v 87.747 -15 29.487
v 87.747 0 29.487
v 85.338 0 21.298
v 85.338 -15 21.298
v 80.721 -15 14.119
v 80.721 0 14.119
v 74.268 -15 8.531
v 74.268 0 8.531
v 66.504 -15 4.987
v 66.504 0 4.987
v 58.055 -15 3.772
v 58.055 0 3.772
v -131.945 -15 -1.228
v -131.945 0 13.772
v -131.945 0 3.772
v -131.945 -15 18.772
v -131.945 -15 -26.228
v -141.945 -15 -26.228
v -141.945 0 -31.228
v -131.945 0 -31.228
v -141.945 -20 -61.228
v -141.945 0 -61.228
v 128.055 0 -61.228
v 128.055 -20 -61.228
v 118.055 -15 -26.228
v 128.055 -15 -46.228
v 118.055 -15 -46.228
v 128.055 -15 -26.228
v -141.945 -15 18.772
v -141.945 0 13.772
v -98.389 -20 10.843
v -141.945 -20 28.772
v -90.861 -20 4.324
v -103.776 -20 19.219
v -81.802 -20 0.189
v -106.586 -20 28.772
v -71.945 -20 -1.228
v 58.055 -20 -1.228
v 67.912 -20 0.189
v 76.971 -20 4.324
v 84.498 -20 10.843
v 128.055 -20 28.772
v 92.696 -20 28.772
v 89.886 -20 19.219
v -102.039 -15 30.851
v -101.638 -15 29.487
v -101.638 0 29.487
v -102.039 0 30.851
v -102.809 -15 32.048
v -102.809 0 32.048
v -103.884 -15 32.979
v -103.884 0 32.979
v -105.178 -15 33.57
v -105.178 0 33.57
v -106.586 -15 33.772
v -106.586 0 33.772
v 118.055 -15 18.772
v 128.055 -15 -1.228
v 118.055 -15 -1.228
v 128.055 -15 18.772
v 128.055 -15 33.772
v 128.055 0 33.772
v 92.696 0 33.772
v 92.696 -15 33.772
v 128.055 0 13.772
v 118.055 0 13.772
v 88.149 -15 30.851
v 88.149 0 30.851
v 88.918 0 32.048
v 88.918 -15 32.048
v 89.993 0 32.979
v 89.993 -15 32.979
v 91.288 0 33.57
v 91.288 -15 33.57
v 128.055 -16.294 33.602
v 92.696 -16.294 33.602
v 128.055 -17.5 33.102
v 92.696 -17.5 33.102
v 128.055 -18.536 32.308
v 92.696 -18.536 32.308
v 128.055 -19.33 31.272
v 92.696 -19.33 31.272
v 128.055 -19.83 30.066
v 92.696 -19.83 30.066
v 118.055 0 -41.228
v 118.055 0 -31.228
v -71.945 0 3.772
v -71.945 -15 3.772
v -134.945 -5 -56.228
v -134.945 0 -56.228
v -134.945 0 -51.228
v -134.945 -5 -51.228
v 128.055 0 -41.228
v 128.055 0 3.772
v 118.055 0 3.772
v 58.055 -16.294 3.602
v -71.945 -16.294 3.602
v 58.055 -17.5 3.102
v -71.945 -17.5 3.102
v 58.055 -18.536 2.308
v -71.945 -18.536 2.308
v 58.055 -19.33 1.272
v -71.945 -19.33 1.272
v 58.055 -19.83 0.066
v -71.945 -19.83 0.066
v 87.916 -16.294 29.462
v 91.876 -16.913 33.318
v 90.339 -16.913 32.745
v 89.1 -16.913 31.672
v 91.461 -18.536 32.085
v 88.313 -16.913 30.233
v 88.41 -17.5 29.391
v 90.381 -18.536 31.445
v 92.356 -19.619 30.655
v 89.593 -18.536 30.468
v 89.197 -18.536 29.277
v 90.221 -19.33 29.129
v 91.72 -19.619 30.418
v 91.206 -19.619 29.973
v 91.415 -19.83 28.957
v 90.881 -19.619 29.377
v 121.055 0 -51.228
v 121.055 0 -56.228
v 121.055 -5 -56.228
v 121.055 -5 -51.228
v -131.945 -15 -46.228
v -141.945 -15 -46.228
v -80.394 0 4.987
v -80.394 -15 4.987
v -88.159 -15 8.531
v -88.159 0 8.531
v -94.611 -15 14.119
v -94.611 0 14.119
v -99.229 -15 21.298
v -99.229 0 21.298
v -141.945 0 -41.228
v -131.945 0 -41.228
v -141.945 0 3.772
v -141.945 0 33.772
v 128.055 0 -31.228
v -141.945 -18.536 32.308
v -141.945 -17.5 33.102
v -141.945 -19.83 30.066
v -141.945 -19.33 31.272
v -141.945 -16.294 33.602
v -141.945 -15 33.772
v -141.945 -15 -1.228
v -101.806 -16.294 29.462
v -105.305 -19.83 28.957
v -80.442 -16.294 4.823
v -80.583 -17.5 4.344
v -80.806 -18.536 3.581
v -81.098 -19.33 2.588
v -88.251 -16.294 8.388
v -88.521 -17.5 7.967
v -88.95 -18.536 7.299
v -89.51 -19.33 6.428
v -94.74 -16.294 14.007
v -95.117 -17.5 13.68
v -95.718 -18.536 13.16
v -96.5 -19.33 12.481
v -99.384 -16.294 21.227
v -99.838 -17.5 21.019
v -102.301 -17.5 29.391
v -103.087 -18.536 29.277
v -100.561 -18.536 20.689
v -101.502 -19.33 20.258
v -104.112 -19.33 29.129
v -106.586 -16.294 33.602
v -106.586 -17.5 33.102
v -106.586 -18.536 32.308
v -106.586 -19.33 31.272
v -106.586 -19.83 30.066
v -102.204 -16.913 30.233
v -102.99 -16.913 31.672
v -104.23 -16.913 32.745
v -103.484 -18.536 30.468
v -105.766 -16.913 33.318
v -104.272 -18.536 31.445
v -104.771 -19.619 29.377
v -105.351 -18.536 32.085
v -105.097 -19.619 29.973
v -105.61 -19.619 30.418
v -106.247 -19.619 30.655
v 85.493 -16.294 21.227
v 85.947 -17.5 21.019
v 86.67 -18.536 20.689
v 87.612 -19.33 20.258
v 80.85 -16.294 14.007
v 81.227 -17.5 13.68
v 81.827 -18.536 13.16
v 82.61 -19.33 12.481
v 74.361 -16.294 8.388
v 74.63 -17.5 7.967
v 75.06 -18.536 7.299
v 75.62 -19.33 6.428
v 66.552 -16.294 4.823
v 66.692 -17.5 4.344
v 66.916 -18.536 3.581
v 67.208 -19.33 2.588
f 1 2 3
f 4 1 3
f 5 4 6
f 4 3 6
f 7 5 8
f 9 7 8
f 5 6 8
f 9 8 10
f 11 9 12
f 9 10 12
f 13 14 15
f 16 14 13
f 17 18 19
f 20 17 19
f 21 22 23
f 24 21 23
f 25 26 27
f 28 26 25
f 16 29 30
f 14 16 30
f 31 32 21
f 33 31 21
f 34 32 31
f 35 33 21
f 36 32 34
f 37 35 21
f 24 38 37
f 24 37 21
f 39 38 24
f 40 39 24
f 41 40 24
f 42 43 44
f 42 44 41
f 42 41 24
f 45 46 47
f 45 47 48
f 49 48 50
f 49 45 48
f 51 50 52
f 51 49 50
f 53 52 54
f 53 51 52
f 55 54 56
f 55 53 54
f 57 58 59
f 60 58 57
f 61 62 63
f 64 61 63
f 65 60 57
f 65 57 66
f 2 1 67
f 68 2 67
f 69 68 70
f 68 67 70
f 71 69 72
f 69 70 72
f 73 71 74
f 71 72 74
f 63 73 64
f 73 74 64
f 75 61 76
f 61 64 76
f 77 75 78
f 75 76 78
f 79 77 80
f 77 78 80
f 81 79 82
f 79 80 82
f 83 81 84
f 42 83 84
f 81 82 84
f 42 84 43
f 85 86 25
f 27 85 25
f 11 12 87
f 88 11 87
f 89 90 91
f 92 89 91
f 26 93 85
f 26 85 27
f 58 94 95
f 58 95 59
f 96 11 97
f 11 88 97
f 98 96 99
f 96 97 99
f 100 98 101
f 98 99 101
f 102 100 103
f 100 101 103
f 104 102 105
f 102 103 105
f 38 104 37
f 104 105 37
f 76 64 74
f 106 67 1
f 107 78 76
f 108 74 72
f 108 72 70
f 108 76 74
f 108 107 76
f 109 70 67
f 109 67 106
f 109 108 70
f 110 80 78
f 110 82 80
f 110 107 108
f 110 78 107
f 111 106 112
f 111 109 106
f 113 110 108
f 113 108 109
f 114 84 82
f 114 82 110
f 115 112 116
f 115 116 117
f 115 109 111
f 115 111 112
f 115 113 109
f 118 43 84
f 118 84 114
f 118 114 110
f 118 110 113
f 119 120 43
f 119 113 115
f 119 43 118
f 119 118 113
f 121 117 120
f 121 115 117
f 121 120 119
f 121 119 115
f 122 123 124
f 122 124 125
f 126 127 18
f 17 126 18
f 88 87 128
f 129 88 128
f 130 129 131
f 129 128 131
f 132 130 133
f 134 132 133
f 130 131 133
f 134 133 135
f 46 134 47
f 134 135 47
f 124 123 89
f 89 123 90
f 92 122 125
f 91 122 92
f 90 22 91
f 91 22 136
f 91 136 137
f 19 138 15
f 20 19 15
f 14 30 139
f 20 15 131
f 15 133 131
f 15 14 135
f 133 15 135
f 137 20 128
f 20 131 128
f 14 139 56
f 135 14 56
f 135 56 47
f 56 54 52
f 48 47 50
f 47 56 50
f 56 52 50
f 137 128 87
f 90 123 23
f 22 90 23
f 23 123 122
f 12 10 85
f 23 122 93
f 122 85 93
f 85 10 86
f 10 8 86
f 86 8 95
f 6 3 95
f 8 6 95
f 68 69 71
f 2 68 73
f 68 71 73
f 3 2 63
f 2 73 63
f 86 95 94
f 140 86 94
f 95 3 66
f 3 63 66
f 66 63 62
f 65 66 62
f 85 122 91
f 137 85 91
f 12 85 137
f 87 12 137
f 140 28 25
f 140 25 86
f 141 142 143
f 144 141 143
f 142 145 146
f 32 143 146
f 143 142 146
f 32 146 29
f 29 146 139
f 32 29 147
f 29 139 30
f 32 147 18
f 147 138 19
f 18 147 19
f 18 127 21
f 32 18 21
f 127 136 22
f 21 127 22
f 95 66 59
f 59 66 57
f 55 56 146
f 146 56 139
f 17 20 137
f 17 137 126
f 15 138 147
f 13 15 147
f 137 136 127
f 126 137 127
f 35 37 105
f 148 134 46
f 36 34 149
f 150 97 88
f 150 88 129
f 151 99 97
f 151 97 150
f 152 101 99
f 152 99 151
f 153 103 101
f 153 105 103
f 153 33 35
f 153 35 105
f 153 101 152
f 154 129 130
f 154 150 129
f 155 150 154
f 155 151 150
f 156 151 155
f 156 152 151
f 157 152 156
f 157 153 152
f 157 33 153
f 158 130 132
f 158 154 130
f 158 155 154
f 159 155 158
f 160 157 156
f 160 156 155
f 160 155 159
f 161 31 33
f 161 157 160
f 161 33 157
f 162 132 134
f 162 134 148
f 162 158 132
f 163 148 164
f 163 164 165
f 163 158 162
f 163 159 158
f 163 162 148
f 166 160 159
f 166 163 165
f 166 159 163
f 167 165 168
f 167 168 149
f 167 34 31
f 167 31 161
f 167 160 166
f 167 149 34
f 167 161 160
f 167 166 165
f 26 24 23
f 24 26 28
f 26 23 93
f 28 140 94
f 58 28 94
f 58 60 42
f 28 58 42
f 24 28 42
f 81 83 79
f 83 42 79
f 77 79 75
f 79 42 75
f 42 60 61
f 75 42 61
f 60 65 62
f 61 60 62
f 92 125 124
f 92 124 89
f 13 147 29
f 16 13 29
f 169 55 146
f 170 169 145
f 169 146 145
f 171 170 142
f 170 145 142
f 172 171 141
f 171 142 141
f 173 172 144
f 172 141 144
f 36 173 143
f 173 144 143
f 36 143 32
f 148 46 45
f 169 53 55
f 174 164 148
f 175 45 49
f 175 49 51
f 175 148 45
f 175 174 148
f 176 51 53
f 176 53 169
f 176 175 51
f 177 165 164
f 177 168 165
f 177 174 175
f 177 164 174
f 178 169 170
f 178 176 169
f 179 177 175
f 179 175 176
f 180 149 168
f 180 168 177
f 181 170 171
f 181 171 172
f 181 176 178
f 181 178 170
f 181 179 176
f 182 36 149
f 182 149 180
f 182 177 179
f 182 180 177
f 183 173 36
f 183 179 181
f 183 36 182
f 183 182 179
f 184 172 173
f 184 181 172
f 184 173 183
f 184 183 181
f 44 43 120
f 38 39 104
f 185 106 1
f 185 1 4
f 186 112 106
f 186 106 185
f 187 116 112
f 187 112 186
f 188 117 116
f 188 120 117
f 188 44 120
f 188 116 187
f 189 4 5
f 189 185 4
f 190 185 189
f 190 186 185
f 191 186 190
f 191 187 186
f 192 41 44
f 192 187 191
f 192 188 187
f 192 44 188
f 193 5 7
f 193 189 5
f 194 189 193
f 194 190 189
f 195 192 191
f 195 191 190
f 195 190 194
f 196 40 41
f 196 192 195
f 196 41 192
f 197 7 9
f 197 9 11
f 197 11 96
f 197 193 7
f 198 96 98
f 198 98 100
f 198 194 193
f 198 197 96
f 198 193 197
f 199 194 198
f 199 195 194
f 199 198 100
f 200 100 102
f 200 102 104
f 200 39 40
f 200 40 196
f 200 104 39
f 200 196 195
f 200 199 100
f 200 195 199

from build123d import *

# Parameters (mm, degrees)
F1_DEPTH  = 20
F2_R      = 5
F3_R      = 5
F10_DEPTH = 10
F9_W      = 256
F9_H      = 5
F12_DEPTH = 5
F13_R     = 5


with BuildPart() as f1:
    # F0 (on Front) → F1 (new body)
    with BuildSketch(Plane.XZ):
        with BuildLine():
            ThreePointArc((-71.9452356547, 3.7722354652), (-93.1584390903, 12.5590320296), (-101.9452356547, 33.7722354652))
            Line((-101.9452356547, 33.7722354652), (-141.9452356547, 33.7722354652))
            Line((-141.9452356547, 33.7722354652), (-141.9452356547, -61.2277645348))
            Line((-141.9452356547, -61.2277645348), (128.0547643453, -61.2277645348))
            Line((128.0547643453, -61.2277645348), (128.0547643453, 33.7722354652))
            Line((128.0547643453, 33.7722354652), (88.0547643453, 33.7722354652))
            ThreePointArc((88.0547643453, 33.7722354652), (79.2679677809, 12.5590320296), (58.0547643453, 3.7722354652))
            Line((58.0547643453, 3.7722354652), (-71.9452356547, 3.7722354652))
        make_face()
    extrude(amount=F1_DEPTH)

    # F2
    f2_edges = [f1.edges().sort_by_distance(p)[0] for p in [
        (-101.945236, -10, 33.772235),
    ]]
    fillet(f2_edges, radius=F2_R)

    # F3
    f3_edges = [f1.edges().sort_by_distance(p)[0] for p in [
        (88.054764, -10, 33.772235),
    ]]
    fillet(f3_edges, radius=F3_R)

    # F4 (on face) → F10 (cut)
    with BuildSketch(Plane(origin=(-141.9452356547, 0, 0), x_dir=(0, -1, 0), z_dir=(-1, 0, 0))):
        Polygon((0, -31.2277645348), (0, -41.2277645348), (15, -46.2277645348), (15, -26.2277645348), align=None)
        Polygon((0, 13.7722354652), (0, 3.7722354652), (15, -1.2277645348), (15, 18.7722354652), align=None)
    extrude(amount=-F10_DEPTH, mode=Mode.SUBTRACT)

    # F11: F1 across plane


with BuildPart() as f1_1:
    add(f1.part)
    add(f1.part.mirror(Plane(origin=(-6.9452356547, 0, 3.7722354652), x_dir=(0, 0, -1), z_dir=(1, 0, 0))), mode=Mode.INTERSECT)

    # F9 (on face) → F12 (cut)
    with BuildSketch(Plane(origin=(0, 0, 0), x_dir=(-1, 0, 0), z_dir=(0, 1, 0))):
        with Locations((6.9452356547, -53.7277645348)):
            Rectangle(F9_W, F9_H)
    extrude(amount=-F12_DEPTH, mode=Mode.SUBTRACT)

    # F13
    f13_edges = [f1_1.edges().sort_by_distance(p)[0] for p in [
        (-6.945236, -20, 3.772235),
        (-91.584846, -20, 11.094367),
        (77.694374, -20, 11.094367),
        (-103.312983, -20, 32.55188),
        (89.422512, -20, 32.55188),
        (110.375272, -20, 33.772235),
        (-124.265744, -20, 33.772235),
    ]]
    fillet(f13_edges, radius=F13_R)


solid = f1_1.part
